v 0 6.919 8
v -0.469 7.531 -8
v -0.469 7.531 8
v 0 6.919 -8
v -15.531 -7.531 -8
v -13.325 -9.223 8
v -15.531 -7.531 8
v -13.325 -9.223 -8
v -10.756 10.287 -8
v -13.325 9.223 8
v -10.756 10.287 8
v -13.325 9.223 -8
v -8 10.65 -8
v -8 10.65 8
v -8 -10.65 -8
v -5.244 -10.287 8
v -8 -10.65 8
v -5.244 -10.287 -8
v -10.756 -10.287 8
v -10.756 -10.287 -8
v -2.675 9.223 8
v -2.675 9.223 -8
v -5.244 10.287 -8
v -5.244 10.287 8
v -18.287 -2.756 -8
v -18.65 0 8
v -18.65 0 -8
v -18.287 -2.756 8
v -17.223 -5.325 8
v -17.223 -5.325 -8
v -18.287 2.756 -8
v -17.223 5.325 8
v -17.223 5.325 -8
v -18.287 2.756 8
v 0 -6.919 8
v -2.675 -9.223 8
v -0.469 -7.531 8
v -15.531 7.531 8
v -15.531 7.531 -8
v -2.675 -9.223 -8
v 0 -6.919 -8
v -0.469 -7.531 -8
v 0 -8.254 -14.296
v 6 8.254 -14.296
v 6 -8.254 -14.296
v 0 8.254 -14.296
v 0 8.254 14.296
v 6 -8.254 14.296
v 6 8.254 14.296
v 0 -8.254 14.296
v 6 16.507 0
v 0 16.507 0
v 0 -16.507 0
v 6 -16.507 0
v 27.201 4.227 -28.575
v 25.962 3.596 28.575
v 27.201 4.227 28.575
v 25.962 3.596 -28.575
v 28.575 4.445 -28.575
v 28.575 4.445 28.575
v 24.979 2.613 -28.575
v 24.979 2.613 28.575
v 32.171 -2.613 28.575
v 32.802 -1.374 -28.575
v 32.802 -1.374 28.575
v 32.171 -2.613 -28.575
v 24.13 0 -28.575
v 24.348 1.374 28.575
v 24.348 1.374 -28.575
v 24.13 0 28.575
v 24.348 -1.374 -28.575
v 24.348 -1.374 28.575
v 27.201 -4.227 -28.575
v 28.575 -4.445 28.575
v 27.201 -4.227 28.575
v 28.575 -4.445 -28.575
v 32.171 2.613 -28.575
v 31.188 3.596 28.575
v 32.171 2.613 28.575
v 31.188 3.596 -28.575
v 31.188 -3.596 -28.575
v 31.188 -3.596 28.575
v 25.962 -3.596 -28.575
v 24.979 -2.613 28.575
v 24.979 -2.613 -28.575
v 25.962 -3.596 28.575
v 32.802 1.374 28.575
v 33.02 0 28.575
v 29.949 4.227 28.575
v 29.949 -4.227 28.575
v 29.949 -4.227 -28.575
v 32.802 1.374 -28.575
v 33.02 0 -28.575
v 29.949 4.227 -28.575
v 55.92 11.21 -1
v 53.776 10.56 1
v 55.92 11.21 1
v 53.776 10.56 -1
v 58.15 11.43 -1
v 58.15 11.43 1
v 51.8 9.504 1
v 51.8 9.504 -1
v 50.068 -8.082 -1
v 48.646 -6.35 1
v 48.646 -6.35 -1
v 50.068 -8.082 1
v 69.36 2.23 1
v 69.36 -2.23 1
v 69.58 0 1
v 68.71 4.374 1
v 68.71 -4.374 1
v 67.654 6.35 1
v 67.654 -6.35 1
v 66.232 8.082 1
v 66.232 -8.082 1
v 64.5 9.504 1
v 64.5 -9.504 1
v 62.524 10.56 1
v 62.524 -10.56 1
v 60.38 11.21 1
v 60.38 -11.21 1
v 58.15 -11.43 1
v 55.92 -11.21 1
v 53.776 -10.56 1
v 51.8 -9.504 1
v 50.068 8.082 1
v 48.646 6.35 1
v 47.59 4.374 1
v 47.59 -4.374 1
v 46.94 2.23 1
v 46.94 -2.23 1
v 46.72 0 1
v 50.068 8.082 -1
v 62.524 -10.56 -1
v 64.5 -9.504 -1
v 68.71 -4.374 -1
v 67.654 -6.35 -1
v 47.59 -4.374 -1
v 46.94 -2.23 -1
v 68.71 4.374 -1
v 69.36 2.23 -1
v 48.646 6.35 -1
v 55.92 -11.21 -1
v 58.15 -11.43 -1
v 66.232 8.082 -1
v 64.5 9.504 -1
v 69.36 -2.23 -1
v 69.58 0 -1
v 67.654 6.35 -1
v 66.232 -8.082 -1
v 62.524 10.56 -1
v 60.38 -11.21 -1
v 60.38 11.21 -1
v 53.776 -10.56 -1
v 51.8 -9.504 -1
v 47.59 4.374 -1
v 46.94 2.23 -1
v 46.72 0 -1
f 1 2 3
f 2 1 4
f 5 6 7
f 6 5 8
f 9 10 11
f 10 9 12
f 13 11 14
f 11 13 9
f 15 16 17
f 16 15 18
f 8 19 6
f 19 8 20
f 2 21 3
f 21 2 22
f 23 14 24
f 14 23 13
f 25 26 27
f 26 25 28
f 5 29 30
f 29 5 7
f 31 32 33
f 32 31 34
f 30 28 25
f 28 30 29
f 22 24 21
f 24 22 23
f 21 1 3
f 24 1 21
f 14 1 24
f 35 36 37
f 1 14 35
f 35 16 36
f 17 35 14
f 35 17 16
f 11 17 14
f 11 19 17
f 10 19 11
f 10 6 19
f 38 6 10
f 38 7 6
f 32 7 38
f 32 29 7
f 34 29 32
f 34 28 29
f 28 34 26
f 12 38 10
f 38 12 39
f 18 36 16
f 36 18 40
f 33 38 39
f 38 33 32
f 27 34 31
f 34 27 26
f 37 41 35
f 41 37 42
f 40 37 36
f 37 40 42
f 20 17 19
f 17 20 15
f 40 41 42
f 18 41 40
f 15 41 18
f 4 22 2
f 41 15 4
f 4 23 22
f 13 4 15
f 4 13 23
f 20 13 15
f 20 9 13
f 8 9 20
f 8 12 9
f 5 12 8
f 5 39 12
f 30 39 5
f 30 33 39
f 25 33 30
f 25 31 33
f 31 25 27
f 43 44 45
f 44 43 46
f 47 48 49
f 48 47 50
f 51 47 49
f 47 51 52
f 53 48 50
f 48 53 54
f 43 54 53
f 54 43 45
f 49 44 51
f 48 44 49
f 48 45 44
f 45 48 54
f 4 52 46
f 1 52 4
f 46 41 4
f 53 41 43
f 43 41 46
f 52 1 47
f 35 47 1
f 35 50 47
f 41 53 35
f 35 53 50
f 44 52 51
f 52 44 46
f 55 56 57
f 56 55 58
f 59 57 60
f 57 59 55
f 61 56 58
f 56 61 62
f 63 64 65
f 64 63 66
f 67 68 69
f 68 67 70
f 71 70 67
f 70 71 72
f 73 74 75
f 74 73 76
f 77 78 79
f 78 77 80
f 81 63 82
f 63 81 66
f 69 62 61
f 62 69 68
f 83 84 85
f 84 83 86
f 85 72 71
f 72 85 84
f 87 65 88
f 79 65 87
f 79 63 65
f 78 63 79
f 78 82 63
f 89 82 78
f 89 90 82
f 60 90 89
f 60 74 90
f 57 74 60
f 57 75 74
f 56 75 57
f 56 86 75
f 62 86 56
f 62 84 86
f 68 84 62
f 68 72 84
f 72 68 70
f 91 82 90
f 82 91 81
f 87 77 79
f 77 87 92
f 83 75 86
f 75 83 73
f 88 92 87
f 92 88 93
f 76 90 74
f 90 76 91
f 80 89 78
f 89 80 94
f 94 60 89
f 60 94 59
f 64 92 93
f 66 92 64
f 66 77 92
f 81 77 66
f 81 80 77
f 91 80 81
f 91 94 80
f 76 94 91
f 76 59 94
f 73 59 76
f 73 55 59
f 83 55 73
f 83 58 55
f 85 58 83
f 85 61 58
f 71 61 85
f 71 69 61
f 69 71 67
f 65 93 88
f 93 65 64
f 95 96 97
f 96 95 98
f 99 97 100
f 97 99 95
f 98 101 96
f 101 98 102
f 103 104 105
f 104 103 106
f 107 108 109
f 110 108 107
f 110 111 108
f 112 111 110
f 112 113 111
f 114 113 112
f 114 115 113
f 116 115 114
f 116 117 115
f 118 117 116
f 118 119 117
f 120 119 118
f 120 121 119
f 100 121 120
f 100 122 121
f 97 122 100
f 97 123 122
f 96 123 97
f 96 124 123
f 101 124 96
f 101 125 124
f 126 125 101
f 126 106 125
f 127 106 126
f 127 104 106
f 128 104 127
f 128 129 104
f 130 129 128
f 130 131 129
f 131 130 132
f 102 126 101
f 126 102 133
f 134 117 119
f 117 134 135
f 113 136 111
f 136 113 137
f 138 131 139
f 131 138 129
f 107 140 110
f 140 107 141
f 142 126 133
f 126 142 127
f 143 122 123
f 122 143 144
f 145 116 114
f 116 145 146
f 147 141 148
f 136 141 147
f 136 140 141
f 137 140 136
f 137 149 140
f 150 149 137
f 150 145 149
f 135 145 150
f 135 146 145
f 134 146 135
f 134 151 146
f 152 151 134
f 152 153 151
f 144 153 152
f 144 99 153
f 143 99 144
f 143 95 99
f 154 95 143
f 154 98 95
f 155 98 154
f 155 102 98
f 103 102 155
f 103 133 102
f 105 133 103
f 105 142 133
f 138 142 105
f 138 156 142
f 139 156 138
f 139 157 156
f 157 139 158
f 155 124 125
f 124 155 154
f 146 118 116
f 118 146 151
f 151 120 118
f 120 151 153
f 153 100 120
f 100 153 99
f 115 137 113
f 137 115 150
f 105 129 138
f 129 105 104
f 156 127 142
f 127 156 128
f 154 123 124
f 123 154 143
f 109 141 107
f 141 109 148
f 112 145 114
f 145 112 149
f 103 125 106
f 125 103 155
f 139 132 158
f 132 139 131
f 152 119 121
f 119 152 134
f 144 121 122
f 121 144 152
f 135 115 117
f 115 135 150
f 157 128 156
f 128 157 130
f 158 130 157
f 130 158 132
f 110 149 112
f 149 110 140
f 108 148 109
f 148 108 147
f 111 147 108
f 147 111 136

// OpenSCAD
// Auto-generated by scripts/author_from_manifest.py (Phase D.3).
// Source: data/phase_d_manifest.json (sku_intent='viking-vk630-sidewall-155f').
// Do not hand-edit — regenerate from the manifest.
//
// @part viking_vk630_sidewall_155f
// @kind sprinkler_head
// @category head.sidewall.k56
// @display-name "Viking VK630 Horizontal Sidewall K5.6 QR 155°F"
// @mfg viking_group
// @mfg-pn VK630
// @listing UL FM
// @hazard-classes LH OH1
// @price-usd 15.25
// @install-minutes 8
// @crew journeyman
// @k-factor 5.6
// @orientation sidewall
// @response quick
// @temperature 155F
// @param size_in number default=0.5 label="Size" unit="in"
// @port inlet position=[0,0.014,0] direction=[0,1,0] style=NPT_threaded size_in=0.5 role=drop

size_in = 0.5;
k_factor = 5.6;

length_mm   = 57.15;
body_dia_mm = 25.40;
thread_od   = 21.3;
thread_len  = 16;
deflector_d = body_dia_mm * 0.9;

rotate([0,0,90]) union() {
    translate([0, thread_len/2, 0])
        cylinder(h = thread_len, d = thread_od, center = true, $fn = 24);
    translate([0, -3, 0])
        rotate([90, 0, 0])
        cylinder(h = 6, d = thread_od * 1.55, $fn = 6, center = true);
    translate([0, -length_mm/2, 0])
        cylinder(h = length_mm, d = body_dia_mm * 0.35, center = true, $fn = 20);
    translate([0, -length_mm - 1, 0])
        cylinder(h = 2, d = deflector_d, center = true, $fn = 32);
}
